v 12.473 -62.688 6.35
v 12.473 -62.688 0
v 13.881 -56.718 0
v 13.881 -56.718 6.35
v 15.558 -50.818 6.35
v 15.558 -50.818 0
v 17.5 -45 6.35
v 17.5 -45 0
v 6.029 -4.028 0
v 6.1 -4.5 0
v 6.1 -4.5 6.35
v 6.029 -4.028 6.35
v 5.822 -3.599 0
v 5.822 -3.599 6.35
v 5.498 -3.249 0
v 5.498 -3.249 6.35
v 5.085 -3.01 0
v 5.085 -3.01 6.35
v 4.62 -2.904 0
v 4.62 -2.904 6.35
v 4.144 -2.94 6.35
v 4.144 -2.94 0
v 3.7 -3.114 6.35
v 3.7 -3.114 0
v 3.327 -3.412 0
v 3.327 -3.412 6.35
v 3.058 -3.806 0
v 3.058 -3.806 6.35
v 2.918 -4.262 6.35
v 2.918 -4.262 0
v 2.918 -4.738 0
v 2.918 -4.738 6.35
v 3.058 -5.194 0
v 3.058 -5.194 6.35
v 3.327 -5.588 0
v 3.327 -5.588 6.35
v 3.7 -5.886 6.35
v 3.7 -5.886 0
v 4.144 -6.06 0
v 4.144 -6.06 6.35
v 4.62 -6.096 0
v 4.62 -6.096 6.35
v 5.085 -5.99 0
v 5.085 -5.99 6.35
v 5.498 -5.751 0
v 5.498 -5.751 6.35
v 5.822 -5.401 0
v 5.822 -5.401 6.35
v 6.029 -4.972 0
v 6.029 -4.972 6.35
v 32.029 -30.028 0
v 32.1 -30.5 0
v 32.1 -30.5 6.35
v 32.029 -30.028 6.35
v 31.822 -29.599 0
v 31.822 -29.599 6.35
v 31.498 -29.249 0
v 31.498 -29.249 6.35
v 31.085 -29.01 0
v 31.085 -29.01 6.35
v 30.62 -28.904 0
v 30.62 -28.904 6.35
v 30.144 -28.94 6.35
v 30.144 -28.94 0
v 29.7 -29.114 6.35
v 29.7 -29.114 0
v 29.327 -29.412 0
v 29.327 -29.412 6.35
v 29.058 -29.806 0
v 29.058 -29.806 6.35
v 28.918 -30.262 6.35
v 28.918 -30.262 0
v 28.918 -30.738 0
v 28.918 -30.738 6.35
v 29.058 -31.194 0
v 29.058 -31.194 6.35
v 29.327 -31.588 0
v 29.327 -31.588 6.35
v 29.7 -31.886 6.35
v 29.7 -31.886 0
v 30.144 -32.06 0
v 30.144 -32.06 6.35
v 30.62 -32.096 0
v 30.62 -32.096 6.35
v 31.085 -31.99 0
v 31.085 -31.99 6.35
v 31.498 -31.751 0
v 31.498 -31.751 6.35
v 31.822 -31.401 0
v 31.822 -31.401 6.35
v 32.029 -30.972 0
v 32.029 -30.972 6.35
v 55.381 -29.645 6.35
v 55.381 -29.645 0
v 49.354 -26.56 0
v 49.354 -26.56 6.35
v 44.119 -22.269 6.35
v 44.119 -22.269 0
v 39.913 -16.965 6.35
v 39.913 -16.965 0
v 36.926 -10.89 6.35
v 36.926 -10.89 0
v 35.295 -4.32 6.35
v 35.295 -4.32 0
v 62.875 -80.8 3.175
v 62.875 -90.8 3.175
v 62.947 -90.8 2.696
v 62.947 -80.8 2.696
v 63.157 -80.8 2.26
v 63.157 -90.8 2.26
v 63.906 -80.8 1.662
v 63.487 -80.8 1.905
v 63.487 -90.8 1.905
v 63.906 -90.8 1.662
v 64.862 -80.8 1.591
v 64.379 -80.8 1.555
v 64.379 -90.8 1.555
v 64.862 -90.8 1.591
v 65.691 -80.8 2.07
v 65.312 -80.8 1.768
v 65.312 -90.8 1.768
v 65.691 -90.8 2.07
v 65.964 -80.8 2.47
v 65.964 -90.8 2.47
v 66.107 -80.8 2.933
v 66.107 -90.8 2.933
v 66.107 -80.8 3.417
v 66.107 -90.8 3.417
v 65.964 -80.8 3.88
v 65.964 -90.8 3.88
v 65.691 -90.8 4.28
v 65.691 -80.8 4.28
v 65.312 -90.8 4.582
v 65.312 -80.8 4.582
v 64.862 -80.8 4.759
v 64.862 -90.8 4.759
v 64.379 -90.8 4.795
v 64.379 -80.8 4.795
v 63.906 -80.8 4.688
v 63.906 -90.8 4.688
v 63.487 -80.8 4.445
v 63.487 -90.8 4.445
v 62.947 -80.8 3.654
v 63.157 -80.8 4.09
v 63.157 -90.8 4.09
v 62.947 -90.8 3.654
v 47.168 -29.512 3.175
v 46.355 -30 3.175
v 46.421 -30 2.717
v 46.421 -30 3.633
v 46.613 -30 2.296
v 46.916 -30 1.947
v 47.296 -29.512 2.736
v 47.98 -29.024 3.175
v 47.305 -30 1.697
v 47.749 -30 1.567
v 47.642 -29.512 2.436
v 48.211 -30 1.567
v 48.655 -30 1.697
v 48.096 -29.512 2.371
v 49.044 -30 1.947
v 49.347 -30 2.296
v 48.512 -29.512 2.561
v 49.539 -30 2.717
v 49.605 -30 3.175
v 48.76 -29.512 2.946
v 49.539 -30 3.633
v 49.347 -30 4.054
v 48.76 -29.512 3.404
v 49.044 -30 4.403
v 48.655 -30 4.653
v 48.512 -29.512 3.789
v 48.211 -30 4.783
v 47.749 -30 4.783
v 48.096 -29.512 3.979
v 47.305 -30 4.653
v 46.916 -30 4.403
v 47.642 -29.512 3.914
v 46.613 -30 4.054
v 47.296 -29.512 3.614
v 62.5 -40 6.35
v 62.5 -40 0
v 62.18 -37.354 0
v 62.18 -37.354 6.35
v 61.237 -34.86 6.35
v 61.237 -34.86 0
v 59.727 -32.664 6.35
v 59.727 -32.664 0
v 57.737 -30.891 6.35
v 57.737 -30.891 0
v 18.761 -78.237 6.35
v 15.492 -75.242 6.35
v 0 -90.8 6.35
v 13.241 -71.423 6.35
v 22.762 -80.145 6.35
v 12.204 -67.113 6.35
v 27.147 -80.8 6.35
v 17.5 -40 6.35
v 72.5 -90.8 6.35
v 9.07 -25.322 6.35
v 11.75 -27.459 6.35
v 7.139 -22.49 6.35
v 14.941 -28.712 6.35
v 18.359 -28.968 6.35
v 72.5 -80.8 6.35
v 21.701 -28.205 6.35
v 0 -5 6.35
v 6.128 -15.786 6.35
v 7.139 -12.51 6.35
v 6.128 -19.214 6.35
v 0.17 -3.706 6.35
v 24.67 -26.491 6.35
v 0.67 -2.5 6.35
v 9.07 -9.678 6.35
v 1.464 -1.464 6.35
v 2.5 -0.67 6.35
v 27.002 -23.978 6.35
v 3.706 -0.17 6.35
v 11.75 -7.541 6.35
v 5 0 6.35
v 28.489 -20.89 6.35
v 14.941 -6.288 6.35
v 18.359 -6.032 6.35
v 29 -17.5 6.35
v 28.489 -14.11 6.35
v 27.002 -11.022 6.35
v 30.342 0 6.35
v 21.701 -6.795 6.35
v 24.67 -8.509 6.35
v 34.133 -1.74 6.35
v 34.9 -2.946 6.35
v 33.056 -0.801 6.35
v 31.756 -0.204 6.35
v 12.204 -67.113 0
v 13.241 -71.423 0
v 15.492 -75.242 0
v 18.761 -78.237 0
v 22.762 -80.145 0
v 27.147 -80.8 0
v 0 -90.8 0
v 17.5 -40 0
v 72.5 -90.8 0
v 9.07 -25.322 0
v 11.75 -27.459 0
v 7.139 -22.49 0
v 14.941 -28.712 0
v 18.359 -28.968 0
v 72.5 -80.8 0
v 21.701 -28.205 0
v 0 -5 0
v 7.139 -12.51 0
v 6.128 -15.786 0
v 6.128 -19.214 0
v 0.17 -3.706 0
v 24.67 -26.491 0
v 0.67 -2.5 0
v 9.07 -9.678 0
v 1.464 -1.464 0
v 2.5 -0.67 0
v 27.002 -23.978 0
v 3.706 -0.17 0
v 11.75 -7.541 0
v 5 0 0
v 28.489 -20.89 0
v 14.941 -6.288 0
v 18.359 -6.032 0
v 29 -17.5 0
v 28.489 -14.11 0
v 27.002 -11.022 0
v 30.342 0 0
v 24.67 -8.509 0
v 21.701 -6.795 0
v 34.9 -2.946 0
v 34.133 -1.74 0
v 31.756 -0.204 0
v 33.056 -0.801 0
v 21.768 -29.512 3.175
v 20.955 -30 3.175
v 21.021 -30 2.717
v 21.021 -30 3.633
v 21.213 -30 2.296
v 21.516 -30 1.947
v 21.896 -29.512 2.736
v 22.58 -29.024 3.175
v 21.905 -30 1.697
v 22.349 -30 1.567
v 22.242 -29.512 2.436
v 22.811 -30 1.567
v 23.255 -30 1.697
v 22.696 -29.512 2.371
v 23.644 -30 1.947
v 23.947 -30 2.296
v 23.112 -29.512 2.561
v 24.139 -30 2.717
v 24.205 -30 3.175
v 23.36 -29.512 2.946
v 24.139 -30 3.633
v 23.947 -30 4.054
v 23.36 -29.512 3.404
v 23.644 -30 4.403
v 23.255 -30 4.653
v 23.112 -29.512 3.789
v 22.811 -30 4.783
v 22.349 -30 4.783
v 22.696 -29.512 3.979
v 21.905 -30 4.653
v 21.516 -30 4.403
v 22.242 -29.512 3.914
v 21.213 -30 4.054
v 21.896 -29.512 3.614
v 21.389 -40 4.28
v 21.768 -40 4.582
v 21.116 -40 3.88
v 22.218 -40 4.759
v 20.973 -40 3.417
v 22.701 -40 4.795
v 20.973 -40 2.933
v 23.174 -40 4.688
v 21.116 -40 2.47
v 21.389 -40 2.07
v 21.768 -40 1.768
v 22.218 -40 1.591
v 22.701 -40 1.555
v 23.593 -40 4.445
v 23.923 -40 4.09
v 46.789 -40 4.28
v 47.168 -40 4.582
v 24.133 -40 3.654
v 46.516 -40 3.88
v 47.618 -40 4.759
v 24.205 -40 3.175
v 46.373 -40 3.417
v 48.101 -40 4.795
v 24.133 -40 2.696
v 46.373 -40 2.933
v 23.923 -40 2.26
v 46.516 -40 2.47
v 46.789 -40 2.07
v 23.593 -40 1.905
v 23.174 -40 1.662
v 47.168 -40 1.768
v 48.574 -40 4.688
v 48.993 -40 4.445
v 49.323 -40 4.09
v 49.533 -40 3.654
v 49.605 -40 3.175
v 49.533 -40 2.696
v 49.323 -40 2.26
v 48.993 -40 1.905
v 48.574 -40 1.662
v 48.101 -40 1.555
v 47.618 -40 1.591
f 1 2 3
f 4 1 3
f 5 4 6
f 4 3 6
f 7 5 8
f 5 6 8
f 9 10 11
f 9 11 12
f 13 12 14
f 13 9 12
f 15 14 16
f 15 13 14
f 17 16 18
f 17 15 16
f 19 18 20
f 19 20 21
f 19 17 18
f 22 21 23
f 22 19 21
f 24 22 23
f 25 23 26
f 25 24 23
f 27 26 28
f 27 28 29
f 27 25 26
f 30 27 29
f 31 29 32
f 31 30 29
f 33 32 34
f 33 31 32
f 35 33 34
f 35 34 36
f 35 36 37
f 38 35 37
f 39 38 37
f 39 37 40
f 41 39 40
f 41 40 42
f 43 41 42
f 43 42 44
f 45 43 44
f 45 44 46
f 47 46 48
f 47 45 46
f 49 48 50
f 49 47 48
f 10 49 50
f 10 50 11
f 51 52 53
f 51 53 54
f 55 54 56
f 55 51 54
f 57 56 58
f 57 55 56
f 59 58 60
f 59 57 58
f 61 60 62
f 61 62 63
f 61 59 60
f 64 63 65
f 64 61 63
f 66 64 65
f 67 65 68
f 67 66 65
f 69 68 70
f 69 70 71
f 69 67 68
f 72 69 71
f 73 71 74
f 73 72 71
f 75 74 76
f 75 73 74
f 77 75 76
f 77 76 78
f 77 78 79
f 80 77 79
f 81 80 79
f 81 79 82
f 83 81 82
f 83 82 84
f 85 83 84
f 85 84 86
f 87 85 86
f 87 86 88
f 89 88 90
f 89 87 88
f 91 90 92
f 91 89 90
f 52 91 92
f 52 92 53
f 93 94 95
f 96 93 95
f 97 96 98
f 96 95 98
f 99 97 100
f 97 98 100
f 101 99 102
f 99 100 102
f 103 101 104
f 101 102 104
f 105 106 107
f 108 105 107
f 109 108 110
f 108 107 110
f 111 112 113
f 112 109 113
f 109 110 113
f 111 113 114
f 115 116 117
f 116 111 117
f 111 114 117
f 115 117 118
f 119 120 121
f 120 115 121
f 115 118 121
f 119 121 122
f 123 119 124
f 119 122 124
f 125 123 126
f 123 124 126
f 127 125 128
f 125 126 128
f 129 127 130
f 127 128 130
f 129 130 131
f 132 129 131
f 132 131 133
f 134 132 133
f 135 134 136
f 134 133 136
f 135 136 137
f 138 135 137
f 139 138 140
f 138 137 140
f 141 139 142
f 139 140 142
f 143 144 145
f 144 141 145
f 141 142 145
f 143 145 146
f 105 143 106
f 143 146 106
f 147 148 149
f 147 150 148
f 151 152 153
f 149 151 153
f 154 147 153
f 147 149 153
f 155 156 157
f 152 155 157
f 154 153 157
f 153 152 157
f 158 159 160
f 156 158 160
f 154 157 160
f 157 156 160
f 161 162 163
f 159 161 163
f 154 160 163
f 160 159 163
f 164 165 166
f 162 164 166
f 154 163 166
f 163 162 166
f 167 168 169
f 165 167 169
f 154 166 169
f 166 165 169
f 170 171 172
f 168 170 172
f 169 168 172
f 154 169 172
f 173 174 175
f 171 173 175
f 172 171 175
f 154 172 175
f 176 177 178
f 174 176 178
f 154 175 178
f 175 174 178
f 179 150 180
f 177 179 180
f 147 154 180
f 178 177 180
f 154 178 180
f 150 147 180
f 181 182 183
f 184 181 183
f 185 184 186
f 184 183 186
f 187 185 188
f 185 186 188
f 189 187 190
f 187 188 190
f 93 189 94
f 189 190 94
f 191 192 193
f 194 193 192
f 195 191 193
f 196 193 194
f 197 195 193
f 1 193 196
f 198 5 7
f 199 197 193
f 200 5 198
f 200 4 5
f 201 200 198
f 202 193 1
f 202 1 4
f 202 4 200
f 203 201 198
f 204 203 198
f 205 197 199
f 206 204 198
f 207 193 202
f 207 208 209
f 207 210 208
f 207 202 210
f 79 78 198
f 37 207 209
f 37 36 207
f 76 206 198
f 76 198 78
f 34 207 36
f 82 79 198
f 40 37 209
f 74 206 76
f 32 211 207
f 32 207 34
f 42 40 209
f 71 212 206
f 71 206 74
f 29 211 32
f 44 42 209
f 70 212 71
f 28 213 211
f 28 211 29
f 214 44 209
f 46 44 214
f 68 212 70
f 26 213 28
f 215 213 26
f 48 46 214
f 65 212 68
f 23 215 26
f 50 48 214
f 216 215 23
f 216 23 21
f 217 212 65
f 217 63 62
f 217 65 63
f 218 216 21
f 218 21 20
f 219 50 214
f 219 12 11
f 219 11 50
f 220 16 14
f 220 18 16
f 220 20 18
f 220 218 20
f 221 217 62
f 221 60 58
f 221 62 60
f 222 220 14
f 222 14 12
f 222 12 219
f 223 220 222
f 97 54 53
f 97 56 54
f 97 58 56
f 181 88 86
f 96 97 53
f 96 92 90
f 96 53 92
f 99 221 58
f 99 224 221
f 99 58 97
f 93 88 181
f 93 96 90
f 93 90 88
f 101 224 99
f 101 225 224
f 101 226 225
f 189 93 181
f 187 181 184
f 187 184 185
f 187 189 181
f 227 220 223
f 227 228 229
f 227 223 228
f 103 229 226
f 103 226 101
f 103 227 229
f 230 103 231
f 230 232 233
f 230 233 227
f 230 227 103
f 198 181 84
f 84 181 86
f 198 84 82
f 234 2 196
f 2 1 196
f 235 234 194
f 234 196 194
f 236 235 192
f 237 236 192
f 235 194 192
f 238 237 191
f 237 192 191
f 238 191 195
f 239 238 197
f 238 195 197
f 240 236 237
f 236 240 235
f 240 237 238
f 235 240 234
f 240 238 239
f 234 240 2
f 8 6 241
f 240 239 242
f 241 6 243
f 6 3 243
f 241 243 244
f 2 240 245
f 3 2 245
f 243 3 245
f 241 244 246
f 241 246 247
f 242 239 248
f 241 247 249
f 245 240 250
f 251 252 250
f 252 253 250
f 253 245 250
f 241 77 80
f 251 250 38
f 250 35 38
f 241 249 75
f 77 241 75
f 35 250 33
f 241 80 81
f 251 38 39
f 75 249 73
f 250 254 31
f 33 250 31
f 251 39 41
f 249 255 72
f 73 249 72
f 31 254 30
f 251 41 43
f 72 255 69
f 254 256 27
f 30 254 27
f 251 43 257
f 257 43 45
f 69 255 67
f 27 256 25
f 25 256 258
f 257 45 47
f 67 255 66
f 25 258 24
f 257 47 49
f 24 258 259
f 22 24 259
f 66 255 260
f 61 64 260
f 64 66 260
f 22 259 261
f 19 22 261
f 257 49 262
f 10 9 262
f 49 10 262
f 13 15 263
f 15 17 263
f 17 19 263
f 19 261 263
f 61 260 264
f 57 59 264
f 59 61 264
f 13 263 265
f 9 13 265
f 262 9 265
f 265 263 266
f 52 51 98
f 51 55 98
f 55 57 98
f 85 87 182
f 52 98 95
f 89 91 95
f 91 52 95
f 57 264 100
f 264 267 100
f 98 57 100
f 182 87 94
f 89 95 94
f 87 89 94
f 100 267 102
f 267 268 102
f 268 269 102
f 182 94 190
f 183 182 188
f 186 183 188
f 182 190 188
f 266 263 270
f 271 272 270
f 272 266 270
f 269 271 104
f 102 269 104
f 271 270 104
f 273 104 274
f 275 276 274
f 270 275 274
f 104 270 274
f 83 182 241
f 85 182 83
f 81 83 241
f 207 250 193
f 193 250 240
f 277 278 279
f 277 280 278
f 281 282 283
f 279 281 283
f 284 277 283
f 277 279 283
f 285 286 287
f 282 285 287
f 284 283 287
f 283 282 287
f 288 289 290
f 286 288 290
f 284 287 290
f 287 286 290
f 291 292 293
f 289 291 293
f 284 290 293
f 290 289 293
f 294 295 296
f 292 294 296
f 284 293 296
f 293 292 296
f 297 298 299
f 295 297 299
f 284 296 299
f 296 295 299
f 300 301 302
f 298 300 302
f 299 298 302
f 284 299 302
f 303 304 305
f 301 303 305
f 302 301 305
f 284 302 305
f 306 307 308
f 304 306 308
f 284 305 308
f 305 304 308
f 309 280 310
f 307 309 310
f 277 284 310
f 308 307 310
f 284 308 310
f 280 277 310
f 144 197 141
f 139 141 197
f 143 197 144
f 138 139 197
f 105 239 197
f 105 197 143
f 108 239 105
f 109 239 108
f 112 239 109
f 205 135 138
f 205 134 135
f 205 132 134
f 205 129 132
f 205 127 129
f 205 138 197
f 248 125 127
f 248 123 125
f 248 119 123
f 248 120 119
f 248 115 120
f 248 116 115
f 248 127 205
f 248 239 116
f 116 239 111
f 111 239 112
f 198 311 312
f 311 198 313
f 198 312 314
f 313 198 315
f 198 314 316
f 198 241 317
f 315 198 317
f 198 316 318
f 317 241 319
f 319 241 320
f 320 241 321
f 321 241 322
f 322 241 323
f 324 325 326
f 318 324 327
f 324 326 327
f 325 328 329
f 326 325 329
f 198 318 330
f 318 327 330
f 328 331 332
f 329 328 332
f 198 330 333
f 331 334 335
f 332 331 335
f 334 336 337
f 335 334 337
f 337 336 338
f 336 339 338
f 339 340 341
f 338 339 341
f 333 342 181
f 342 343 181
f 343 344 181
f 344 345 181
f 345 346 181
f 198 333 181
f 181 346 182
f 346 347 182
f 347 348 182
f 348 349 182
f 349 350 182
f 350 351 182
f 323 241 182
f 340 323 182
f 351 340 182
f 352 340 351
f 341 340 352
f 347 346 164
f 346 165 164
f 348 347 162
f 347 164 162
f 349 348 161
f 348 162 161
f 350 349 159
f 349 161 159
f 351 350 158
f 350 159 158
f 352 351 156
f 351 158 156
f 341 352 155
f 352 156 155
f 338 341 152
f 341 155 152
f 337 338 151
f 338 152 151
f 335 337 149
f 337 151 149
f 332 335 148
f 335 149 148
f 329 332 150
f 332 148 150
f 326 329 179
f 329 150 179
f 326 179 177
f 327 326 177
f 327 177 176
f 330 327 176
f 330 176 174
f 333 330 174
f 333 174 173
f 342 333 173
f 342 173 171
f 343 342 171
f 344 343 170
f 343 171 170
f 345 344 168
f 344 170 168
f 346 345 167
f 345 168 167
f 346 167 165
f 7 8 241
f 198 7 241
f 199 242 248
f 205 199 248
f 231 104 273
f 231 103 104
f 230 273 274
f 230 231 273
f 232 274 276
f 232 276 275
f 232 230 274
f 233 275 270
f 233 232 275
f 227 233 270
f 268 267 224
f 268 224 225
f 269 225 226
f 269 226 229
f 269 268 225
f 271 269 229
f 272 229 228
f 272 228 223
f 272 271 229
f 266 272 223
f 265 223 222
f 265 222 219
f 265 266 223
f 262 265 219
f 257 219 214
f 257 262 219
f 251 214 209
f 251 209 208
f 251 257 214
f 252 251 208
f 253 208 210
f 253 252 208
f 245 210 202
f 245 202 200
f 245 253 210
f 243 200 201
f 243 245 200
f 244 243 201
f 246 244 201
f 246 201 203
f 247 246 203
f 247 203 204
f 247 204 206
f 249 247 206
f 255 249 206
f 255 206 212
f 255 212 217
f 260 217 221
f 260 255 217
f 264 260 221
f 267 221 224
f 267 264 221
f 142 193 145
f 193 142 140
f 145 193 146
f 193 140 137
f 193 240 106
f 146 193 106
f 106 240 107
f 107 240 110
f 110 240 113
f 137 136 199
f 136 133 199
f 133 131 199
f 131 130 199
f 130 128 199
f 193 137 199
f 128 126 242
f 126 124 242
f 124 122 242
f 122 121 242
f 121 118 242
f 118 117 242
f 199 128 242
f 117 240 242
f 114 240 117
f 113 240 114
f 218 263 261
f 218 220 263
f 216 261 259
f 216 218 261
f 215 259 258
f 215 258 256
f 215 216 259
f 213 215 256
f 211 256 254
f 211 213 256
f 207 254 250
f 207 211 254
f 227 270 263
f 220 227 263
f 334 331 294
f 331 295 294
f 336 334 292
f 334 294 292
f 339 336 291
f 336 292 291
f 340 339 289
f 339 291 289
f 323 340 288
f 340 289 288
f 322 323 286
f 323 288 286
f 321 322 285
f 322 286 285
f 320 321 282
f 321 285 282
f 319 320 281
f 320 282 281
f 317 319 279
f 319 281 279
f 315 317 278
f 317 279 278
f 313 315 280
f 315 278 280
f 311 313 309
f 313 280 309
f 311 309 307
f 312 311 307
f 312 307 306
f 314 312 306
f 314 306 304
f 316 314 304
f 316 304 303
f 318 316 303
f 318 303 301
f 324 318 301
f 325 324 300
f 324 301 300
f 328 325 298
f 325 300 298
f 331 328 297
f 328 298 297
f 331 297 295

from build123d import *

# Parameters (mm, degrees)
SKETCH1_R                 = 1.6002
SKETCH1_R_2               = 11.5
BOSS_EXTRUDE1_DEPTH       = 6.35
F_6_32_TAPPED_HOLE1_D     = 3.25
F_6_32_TAPPED_HOLE1_DEPTH = 10
F_6_32_TAPPED_HOLE1_TIP   = 0.976398506
REDONDEO1_R               = 15
SKETCH1_4_W               = 10
SKETCH1_4_H               = 10
SALIENTE_EXTRUIR1_DEPTH   = 6.35
CORTAR_EXTRUIR1_REACH     = 118.367
REDONDEO2_R               = 5


with BuildPart() as part:
    # Sketch1 → Boss-Extrude1 (new body)
    with BuildSketch(Plane.XY):
        with BuildLine():
            Line((17.5, -40), (62.5, -40))
            ThreePointArc((62.5, -40), (60.548464977, -33.716680328), (55.380636605, -29.644562334))
            ThreePointArc((55.380636605, -29.644562334), (40.586668907, -17.987290127), (35, 0))
            Line((35, 0), (0, 0))
            Line((0, 0), (0, -40))
            Line((0, -40), (0, -90.8))
            Line((0, -90.8), (9.525, -90.8))
            Line((9.525, -90.8), (62.5, -90.8))
            Line((62.5, -90.8), (62.5, -80.8))
            Line((62.5, -80.8), (9.894504833, -80.8))
            ThreePointArc((9.894504833, -80.8), (12.482988146, -62.642036842), (17.5, -45))
            Line((17.5, -45), (17.5, -40))
        make_face()
        with Locations((4.5, -4.5)):
            Circle(SKETCH1_R, mode=Mode.SUBTRACT)
        with Locations((17.5, -17.5)):
            Circle(SKETCH1_R_2, mode=Mode.SUBTRACT)
        with Locations((30.5, -30.5)):
            Circle(SKETCH1_R, mode=Mode.SUBTRACT)
    extrude(amount=BOSS_EXTRUDE1_DEPTH)

    # #6-32 Tapped Hole1
    with Locations(Plane(origin=(0, -40, 0), x_dir=(-1, 0, 0), z_dir=(0, -1, 0))):
        with Locations((-22.58, -3.175), (-47.98, -3.175)):
            Hole(F_6_32_TAPPED_HOLE1_D / 2, depth=F_6_32_TAPPED_HOLE1_DEPTH)
            with Locations((0, 0, -(F_6_32_TAPPED_HOLE1_DEPTH + F_6_32_TAPPED_HOLE1_TIP / 2))):  # 118° drill point
                Cone(0, F_6_32_TAPPED_HOLE1_D / 2, F_6_32_TAPPED_HOLE1_TIP, mode=Mode.SUBTRACT)

    # Redondeo1
    redondeo1_edges = [part.edges().sort_by_distance(p)[0] for p in [
        (9.894504833, -80.8, 3.175),
    ]]
    fillet(redondeo1_edges, radius=REDONDEO1_R)

    # Sketch1<4> → Saliente-Extruir1 (add)
    with BuildSketch(Plane.XY):
        with Locations((67.5, -85.8)):
            Rectangle(SKETCH1_4_W, SKETCH1_4_H)
    extrude(amount=SALIENTE_EXTRUIR1_DEPTH)

    # Croquis1 → Cortar-Extruir1 (cut, up to next)
    with BuildSketch(Plane.XZ.offset(90.8), mode=Mode.PRIVATE) as cortar_extruir1_sk1:
        with BuildLine():
            ThreePointArc((62.875, 3.175), (64.5, 1.55), (66.125, 3.175))
            Line((66.125, 3.175), (62.875, 3.175))
        make_face()
    cortar_extruir1_tool1 = extrude(cortar_extruir1_sk1.sketch, amount=-CORTAR_EXTRUIR1_REACH, mode=Mode.PRIVATE) & part.part
    # Croquis1 → Cortar-Extruir1 (cut, up to next)
    with BuildSketch(Plane.XZ.offset(90.8), mode=Mode.PRIVATE) as cortar_extruir1_sk2:
        with BuildLine():
            Line((62.875, 3.175), (66.125, 3.175))
            ThreePointArc((66.125, 3.175), (64.5, 4.8), (62.875, 3.175))
        make_face()
    cortar_extruir1_tool2 = extrude(cortar_extruir1_sk2.sketch, amount=-CORTAR_EXTRUIR1_REACH, mode=Mode.PRIVATE) & part.part
    # Croquis1 → Cortar-Extruir1 (cut, up to next)
    with BuildSketch(Plane.XZ.offset(90.8), mode=Mode.PRIVATE) as cortar_extruir1_sk3:
        with BuildLine():
            ThreePointArc((62.875, 3.175), (64.5, 1.55), (66.125, 3.175))
            Line((66.125, 3.175), (62.875, 3.175))
        make_face()
    cortar_extruir1_tool3 = extrude(cortar_extruir1_sk3.sketch, amount=-CORTAR_EXTRUIR1_REACH, mode=Mode.PRIVATE) & part.part
    # Croquis1 → Cortar-Extruir1 (cut, up to next)
    with BuildSketch(Plane.XZ.offset(90.8), mode=Mode.PRIVATE) as cortar_extruir1_sk4:
        with BuildLine():
            Line((62.875, 3.175), (66.125, 3.175))
            ThreePointArc((66.125, 3.175), (64.5, 4.8), (62.875, 3.175))
        make_face()
    cortar_extruir1_tool4 = extrude(cortar_extruir1_sk4.sketch, amount=-CORTAR_EXTRUIR1_REACH, mode=Mode.PRIVATE) & part.part
    add(cortar_extruir1_tool1.solids().sort_by_distance((64.5, -90.8, 2.485329))[0], mode=Mode.SUBTRACT)
    add(cortar_extruir1_tool2.solids().sort_by_distance((64.5, -90.8, 3.864671))[0], mode=Mode.SUBTRACT)
    add(cortar_extruir1_tool3.solids().sort_by_distance((64.5, -90.8, 2.485329))[0], mode=Mode.SUBTRACT)
    add(cortar_extruir1_tool4.solids().sort_by_distance((64.5, -90.8, 3.864671))[0], mode=Mode.SUBTRACT)

    # Redondeo2
    redondeo2_edges = [part.edges().sort_by_distance(p)[0] for p in [
        (0, 0, 3.175),
        (35, 0, 3.175),
    ]]
    fillet(redondeo2_edges, radius=REDONDEO2_R)


solid = part.part
